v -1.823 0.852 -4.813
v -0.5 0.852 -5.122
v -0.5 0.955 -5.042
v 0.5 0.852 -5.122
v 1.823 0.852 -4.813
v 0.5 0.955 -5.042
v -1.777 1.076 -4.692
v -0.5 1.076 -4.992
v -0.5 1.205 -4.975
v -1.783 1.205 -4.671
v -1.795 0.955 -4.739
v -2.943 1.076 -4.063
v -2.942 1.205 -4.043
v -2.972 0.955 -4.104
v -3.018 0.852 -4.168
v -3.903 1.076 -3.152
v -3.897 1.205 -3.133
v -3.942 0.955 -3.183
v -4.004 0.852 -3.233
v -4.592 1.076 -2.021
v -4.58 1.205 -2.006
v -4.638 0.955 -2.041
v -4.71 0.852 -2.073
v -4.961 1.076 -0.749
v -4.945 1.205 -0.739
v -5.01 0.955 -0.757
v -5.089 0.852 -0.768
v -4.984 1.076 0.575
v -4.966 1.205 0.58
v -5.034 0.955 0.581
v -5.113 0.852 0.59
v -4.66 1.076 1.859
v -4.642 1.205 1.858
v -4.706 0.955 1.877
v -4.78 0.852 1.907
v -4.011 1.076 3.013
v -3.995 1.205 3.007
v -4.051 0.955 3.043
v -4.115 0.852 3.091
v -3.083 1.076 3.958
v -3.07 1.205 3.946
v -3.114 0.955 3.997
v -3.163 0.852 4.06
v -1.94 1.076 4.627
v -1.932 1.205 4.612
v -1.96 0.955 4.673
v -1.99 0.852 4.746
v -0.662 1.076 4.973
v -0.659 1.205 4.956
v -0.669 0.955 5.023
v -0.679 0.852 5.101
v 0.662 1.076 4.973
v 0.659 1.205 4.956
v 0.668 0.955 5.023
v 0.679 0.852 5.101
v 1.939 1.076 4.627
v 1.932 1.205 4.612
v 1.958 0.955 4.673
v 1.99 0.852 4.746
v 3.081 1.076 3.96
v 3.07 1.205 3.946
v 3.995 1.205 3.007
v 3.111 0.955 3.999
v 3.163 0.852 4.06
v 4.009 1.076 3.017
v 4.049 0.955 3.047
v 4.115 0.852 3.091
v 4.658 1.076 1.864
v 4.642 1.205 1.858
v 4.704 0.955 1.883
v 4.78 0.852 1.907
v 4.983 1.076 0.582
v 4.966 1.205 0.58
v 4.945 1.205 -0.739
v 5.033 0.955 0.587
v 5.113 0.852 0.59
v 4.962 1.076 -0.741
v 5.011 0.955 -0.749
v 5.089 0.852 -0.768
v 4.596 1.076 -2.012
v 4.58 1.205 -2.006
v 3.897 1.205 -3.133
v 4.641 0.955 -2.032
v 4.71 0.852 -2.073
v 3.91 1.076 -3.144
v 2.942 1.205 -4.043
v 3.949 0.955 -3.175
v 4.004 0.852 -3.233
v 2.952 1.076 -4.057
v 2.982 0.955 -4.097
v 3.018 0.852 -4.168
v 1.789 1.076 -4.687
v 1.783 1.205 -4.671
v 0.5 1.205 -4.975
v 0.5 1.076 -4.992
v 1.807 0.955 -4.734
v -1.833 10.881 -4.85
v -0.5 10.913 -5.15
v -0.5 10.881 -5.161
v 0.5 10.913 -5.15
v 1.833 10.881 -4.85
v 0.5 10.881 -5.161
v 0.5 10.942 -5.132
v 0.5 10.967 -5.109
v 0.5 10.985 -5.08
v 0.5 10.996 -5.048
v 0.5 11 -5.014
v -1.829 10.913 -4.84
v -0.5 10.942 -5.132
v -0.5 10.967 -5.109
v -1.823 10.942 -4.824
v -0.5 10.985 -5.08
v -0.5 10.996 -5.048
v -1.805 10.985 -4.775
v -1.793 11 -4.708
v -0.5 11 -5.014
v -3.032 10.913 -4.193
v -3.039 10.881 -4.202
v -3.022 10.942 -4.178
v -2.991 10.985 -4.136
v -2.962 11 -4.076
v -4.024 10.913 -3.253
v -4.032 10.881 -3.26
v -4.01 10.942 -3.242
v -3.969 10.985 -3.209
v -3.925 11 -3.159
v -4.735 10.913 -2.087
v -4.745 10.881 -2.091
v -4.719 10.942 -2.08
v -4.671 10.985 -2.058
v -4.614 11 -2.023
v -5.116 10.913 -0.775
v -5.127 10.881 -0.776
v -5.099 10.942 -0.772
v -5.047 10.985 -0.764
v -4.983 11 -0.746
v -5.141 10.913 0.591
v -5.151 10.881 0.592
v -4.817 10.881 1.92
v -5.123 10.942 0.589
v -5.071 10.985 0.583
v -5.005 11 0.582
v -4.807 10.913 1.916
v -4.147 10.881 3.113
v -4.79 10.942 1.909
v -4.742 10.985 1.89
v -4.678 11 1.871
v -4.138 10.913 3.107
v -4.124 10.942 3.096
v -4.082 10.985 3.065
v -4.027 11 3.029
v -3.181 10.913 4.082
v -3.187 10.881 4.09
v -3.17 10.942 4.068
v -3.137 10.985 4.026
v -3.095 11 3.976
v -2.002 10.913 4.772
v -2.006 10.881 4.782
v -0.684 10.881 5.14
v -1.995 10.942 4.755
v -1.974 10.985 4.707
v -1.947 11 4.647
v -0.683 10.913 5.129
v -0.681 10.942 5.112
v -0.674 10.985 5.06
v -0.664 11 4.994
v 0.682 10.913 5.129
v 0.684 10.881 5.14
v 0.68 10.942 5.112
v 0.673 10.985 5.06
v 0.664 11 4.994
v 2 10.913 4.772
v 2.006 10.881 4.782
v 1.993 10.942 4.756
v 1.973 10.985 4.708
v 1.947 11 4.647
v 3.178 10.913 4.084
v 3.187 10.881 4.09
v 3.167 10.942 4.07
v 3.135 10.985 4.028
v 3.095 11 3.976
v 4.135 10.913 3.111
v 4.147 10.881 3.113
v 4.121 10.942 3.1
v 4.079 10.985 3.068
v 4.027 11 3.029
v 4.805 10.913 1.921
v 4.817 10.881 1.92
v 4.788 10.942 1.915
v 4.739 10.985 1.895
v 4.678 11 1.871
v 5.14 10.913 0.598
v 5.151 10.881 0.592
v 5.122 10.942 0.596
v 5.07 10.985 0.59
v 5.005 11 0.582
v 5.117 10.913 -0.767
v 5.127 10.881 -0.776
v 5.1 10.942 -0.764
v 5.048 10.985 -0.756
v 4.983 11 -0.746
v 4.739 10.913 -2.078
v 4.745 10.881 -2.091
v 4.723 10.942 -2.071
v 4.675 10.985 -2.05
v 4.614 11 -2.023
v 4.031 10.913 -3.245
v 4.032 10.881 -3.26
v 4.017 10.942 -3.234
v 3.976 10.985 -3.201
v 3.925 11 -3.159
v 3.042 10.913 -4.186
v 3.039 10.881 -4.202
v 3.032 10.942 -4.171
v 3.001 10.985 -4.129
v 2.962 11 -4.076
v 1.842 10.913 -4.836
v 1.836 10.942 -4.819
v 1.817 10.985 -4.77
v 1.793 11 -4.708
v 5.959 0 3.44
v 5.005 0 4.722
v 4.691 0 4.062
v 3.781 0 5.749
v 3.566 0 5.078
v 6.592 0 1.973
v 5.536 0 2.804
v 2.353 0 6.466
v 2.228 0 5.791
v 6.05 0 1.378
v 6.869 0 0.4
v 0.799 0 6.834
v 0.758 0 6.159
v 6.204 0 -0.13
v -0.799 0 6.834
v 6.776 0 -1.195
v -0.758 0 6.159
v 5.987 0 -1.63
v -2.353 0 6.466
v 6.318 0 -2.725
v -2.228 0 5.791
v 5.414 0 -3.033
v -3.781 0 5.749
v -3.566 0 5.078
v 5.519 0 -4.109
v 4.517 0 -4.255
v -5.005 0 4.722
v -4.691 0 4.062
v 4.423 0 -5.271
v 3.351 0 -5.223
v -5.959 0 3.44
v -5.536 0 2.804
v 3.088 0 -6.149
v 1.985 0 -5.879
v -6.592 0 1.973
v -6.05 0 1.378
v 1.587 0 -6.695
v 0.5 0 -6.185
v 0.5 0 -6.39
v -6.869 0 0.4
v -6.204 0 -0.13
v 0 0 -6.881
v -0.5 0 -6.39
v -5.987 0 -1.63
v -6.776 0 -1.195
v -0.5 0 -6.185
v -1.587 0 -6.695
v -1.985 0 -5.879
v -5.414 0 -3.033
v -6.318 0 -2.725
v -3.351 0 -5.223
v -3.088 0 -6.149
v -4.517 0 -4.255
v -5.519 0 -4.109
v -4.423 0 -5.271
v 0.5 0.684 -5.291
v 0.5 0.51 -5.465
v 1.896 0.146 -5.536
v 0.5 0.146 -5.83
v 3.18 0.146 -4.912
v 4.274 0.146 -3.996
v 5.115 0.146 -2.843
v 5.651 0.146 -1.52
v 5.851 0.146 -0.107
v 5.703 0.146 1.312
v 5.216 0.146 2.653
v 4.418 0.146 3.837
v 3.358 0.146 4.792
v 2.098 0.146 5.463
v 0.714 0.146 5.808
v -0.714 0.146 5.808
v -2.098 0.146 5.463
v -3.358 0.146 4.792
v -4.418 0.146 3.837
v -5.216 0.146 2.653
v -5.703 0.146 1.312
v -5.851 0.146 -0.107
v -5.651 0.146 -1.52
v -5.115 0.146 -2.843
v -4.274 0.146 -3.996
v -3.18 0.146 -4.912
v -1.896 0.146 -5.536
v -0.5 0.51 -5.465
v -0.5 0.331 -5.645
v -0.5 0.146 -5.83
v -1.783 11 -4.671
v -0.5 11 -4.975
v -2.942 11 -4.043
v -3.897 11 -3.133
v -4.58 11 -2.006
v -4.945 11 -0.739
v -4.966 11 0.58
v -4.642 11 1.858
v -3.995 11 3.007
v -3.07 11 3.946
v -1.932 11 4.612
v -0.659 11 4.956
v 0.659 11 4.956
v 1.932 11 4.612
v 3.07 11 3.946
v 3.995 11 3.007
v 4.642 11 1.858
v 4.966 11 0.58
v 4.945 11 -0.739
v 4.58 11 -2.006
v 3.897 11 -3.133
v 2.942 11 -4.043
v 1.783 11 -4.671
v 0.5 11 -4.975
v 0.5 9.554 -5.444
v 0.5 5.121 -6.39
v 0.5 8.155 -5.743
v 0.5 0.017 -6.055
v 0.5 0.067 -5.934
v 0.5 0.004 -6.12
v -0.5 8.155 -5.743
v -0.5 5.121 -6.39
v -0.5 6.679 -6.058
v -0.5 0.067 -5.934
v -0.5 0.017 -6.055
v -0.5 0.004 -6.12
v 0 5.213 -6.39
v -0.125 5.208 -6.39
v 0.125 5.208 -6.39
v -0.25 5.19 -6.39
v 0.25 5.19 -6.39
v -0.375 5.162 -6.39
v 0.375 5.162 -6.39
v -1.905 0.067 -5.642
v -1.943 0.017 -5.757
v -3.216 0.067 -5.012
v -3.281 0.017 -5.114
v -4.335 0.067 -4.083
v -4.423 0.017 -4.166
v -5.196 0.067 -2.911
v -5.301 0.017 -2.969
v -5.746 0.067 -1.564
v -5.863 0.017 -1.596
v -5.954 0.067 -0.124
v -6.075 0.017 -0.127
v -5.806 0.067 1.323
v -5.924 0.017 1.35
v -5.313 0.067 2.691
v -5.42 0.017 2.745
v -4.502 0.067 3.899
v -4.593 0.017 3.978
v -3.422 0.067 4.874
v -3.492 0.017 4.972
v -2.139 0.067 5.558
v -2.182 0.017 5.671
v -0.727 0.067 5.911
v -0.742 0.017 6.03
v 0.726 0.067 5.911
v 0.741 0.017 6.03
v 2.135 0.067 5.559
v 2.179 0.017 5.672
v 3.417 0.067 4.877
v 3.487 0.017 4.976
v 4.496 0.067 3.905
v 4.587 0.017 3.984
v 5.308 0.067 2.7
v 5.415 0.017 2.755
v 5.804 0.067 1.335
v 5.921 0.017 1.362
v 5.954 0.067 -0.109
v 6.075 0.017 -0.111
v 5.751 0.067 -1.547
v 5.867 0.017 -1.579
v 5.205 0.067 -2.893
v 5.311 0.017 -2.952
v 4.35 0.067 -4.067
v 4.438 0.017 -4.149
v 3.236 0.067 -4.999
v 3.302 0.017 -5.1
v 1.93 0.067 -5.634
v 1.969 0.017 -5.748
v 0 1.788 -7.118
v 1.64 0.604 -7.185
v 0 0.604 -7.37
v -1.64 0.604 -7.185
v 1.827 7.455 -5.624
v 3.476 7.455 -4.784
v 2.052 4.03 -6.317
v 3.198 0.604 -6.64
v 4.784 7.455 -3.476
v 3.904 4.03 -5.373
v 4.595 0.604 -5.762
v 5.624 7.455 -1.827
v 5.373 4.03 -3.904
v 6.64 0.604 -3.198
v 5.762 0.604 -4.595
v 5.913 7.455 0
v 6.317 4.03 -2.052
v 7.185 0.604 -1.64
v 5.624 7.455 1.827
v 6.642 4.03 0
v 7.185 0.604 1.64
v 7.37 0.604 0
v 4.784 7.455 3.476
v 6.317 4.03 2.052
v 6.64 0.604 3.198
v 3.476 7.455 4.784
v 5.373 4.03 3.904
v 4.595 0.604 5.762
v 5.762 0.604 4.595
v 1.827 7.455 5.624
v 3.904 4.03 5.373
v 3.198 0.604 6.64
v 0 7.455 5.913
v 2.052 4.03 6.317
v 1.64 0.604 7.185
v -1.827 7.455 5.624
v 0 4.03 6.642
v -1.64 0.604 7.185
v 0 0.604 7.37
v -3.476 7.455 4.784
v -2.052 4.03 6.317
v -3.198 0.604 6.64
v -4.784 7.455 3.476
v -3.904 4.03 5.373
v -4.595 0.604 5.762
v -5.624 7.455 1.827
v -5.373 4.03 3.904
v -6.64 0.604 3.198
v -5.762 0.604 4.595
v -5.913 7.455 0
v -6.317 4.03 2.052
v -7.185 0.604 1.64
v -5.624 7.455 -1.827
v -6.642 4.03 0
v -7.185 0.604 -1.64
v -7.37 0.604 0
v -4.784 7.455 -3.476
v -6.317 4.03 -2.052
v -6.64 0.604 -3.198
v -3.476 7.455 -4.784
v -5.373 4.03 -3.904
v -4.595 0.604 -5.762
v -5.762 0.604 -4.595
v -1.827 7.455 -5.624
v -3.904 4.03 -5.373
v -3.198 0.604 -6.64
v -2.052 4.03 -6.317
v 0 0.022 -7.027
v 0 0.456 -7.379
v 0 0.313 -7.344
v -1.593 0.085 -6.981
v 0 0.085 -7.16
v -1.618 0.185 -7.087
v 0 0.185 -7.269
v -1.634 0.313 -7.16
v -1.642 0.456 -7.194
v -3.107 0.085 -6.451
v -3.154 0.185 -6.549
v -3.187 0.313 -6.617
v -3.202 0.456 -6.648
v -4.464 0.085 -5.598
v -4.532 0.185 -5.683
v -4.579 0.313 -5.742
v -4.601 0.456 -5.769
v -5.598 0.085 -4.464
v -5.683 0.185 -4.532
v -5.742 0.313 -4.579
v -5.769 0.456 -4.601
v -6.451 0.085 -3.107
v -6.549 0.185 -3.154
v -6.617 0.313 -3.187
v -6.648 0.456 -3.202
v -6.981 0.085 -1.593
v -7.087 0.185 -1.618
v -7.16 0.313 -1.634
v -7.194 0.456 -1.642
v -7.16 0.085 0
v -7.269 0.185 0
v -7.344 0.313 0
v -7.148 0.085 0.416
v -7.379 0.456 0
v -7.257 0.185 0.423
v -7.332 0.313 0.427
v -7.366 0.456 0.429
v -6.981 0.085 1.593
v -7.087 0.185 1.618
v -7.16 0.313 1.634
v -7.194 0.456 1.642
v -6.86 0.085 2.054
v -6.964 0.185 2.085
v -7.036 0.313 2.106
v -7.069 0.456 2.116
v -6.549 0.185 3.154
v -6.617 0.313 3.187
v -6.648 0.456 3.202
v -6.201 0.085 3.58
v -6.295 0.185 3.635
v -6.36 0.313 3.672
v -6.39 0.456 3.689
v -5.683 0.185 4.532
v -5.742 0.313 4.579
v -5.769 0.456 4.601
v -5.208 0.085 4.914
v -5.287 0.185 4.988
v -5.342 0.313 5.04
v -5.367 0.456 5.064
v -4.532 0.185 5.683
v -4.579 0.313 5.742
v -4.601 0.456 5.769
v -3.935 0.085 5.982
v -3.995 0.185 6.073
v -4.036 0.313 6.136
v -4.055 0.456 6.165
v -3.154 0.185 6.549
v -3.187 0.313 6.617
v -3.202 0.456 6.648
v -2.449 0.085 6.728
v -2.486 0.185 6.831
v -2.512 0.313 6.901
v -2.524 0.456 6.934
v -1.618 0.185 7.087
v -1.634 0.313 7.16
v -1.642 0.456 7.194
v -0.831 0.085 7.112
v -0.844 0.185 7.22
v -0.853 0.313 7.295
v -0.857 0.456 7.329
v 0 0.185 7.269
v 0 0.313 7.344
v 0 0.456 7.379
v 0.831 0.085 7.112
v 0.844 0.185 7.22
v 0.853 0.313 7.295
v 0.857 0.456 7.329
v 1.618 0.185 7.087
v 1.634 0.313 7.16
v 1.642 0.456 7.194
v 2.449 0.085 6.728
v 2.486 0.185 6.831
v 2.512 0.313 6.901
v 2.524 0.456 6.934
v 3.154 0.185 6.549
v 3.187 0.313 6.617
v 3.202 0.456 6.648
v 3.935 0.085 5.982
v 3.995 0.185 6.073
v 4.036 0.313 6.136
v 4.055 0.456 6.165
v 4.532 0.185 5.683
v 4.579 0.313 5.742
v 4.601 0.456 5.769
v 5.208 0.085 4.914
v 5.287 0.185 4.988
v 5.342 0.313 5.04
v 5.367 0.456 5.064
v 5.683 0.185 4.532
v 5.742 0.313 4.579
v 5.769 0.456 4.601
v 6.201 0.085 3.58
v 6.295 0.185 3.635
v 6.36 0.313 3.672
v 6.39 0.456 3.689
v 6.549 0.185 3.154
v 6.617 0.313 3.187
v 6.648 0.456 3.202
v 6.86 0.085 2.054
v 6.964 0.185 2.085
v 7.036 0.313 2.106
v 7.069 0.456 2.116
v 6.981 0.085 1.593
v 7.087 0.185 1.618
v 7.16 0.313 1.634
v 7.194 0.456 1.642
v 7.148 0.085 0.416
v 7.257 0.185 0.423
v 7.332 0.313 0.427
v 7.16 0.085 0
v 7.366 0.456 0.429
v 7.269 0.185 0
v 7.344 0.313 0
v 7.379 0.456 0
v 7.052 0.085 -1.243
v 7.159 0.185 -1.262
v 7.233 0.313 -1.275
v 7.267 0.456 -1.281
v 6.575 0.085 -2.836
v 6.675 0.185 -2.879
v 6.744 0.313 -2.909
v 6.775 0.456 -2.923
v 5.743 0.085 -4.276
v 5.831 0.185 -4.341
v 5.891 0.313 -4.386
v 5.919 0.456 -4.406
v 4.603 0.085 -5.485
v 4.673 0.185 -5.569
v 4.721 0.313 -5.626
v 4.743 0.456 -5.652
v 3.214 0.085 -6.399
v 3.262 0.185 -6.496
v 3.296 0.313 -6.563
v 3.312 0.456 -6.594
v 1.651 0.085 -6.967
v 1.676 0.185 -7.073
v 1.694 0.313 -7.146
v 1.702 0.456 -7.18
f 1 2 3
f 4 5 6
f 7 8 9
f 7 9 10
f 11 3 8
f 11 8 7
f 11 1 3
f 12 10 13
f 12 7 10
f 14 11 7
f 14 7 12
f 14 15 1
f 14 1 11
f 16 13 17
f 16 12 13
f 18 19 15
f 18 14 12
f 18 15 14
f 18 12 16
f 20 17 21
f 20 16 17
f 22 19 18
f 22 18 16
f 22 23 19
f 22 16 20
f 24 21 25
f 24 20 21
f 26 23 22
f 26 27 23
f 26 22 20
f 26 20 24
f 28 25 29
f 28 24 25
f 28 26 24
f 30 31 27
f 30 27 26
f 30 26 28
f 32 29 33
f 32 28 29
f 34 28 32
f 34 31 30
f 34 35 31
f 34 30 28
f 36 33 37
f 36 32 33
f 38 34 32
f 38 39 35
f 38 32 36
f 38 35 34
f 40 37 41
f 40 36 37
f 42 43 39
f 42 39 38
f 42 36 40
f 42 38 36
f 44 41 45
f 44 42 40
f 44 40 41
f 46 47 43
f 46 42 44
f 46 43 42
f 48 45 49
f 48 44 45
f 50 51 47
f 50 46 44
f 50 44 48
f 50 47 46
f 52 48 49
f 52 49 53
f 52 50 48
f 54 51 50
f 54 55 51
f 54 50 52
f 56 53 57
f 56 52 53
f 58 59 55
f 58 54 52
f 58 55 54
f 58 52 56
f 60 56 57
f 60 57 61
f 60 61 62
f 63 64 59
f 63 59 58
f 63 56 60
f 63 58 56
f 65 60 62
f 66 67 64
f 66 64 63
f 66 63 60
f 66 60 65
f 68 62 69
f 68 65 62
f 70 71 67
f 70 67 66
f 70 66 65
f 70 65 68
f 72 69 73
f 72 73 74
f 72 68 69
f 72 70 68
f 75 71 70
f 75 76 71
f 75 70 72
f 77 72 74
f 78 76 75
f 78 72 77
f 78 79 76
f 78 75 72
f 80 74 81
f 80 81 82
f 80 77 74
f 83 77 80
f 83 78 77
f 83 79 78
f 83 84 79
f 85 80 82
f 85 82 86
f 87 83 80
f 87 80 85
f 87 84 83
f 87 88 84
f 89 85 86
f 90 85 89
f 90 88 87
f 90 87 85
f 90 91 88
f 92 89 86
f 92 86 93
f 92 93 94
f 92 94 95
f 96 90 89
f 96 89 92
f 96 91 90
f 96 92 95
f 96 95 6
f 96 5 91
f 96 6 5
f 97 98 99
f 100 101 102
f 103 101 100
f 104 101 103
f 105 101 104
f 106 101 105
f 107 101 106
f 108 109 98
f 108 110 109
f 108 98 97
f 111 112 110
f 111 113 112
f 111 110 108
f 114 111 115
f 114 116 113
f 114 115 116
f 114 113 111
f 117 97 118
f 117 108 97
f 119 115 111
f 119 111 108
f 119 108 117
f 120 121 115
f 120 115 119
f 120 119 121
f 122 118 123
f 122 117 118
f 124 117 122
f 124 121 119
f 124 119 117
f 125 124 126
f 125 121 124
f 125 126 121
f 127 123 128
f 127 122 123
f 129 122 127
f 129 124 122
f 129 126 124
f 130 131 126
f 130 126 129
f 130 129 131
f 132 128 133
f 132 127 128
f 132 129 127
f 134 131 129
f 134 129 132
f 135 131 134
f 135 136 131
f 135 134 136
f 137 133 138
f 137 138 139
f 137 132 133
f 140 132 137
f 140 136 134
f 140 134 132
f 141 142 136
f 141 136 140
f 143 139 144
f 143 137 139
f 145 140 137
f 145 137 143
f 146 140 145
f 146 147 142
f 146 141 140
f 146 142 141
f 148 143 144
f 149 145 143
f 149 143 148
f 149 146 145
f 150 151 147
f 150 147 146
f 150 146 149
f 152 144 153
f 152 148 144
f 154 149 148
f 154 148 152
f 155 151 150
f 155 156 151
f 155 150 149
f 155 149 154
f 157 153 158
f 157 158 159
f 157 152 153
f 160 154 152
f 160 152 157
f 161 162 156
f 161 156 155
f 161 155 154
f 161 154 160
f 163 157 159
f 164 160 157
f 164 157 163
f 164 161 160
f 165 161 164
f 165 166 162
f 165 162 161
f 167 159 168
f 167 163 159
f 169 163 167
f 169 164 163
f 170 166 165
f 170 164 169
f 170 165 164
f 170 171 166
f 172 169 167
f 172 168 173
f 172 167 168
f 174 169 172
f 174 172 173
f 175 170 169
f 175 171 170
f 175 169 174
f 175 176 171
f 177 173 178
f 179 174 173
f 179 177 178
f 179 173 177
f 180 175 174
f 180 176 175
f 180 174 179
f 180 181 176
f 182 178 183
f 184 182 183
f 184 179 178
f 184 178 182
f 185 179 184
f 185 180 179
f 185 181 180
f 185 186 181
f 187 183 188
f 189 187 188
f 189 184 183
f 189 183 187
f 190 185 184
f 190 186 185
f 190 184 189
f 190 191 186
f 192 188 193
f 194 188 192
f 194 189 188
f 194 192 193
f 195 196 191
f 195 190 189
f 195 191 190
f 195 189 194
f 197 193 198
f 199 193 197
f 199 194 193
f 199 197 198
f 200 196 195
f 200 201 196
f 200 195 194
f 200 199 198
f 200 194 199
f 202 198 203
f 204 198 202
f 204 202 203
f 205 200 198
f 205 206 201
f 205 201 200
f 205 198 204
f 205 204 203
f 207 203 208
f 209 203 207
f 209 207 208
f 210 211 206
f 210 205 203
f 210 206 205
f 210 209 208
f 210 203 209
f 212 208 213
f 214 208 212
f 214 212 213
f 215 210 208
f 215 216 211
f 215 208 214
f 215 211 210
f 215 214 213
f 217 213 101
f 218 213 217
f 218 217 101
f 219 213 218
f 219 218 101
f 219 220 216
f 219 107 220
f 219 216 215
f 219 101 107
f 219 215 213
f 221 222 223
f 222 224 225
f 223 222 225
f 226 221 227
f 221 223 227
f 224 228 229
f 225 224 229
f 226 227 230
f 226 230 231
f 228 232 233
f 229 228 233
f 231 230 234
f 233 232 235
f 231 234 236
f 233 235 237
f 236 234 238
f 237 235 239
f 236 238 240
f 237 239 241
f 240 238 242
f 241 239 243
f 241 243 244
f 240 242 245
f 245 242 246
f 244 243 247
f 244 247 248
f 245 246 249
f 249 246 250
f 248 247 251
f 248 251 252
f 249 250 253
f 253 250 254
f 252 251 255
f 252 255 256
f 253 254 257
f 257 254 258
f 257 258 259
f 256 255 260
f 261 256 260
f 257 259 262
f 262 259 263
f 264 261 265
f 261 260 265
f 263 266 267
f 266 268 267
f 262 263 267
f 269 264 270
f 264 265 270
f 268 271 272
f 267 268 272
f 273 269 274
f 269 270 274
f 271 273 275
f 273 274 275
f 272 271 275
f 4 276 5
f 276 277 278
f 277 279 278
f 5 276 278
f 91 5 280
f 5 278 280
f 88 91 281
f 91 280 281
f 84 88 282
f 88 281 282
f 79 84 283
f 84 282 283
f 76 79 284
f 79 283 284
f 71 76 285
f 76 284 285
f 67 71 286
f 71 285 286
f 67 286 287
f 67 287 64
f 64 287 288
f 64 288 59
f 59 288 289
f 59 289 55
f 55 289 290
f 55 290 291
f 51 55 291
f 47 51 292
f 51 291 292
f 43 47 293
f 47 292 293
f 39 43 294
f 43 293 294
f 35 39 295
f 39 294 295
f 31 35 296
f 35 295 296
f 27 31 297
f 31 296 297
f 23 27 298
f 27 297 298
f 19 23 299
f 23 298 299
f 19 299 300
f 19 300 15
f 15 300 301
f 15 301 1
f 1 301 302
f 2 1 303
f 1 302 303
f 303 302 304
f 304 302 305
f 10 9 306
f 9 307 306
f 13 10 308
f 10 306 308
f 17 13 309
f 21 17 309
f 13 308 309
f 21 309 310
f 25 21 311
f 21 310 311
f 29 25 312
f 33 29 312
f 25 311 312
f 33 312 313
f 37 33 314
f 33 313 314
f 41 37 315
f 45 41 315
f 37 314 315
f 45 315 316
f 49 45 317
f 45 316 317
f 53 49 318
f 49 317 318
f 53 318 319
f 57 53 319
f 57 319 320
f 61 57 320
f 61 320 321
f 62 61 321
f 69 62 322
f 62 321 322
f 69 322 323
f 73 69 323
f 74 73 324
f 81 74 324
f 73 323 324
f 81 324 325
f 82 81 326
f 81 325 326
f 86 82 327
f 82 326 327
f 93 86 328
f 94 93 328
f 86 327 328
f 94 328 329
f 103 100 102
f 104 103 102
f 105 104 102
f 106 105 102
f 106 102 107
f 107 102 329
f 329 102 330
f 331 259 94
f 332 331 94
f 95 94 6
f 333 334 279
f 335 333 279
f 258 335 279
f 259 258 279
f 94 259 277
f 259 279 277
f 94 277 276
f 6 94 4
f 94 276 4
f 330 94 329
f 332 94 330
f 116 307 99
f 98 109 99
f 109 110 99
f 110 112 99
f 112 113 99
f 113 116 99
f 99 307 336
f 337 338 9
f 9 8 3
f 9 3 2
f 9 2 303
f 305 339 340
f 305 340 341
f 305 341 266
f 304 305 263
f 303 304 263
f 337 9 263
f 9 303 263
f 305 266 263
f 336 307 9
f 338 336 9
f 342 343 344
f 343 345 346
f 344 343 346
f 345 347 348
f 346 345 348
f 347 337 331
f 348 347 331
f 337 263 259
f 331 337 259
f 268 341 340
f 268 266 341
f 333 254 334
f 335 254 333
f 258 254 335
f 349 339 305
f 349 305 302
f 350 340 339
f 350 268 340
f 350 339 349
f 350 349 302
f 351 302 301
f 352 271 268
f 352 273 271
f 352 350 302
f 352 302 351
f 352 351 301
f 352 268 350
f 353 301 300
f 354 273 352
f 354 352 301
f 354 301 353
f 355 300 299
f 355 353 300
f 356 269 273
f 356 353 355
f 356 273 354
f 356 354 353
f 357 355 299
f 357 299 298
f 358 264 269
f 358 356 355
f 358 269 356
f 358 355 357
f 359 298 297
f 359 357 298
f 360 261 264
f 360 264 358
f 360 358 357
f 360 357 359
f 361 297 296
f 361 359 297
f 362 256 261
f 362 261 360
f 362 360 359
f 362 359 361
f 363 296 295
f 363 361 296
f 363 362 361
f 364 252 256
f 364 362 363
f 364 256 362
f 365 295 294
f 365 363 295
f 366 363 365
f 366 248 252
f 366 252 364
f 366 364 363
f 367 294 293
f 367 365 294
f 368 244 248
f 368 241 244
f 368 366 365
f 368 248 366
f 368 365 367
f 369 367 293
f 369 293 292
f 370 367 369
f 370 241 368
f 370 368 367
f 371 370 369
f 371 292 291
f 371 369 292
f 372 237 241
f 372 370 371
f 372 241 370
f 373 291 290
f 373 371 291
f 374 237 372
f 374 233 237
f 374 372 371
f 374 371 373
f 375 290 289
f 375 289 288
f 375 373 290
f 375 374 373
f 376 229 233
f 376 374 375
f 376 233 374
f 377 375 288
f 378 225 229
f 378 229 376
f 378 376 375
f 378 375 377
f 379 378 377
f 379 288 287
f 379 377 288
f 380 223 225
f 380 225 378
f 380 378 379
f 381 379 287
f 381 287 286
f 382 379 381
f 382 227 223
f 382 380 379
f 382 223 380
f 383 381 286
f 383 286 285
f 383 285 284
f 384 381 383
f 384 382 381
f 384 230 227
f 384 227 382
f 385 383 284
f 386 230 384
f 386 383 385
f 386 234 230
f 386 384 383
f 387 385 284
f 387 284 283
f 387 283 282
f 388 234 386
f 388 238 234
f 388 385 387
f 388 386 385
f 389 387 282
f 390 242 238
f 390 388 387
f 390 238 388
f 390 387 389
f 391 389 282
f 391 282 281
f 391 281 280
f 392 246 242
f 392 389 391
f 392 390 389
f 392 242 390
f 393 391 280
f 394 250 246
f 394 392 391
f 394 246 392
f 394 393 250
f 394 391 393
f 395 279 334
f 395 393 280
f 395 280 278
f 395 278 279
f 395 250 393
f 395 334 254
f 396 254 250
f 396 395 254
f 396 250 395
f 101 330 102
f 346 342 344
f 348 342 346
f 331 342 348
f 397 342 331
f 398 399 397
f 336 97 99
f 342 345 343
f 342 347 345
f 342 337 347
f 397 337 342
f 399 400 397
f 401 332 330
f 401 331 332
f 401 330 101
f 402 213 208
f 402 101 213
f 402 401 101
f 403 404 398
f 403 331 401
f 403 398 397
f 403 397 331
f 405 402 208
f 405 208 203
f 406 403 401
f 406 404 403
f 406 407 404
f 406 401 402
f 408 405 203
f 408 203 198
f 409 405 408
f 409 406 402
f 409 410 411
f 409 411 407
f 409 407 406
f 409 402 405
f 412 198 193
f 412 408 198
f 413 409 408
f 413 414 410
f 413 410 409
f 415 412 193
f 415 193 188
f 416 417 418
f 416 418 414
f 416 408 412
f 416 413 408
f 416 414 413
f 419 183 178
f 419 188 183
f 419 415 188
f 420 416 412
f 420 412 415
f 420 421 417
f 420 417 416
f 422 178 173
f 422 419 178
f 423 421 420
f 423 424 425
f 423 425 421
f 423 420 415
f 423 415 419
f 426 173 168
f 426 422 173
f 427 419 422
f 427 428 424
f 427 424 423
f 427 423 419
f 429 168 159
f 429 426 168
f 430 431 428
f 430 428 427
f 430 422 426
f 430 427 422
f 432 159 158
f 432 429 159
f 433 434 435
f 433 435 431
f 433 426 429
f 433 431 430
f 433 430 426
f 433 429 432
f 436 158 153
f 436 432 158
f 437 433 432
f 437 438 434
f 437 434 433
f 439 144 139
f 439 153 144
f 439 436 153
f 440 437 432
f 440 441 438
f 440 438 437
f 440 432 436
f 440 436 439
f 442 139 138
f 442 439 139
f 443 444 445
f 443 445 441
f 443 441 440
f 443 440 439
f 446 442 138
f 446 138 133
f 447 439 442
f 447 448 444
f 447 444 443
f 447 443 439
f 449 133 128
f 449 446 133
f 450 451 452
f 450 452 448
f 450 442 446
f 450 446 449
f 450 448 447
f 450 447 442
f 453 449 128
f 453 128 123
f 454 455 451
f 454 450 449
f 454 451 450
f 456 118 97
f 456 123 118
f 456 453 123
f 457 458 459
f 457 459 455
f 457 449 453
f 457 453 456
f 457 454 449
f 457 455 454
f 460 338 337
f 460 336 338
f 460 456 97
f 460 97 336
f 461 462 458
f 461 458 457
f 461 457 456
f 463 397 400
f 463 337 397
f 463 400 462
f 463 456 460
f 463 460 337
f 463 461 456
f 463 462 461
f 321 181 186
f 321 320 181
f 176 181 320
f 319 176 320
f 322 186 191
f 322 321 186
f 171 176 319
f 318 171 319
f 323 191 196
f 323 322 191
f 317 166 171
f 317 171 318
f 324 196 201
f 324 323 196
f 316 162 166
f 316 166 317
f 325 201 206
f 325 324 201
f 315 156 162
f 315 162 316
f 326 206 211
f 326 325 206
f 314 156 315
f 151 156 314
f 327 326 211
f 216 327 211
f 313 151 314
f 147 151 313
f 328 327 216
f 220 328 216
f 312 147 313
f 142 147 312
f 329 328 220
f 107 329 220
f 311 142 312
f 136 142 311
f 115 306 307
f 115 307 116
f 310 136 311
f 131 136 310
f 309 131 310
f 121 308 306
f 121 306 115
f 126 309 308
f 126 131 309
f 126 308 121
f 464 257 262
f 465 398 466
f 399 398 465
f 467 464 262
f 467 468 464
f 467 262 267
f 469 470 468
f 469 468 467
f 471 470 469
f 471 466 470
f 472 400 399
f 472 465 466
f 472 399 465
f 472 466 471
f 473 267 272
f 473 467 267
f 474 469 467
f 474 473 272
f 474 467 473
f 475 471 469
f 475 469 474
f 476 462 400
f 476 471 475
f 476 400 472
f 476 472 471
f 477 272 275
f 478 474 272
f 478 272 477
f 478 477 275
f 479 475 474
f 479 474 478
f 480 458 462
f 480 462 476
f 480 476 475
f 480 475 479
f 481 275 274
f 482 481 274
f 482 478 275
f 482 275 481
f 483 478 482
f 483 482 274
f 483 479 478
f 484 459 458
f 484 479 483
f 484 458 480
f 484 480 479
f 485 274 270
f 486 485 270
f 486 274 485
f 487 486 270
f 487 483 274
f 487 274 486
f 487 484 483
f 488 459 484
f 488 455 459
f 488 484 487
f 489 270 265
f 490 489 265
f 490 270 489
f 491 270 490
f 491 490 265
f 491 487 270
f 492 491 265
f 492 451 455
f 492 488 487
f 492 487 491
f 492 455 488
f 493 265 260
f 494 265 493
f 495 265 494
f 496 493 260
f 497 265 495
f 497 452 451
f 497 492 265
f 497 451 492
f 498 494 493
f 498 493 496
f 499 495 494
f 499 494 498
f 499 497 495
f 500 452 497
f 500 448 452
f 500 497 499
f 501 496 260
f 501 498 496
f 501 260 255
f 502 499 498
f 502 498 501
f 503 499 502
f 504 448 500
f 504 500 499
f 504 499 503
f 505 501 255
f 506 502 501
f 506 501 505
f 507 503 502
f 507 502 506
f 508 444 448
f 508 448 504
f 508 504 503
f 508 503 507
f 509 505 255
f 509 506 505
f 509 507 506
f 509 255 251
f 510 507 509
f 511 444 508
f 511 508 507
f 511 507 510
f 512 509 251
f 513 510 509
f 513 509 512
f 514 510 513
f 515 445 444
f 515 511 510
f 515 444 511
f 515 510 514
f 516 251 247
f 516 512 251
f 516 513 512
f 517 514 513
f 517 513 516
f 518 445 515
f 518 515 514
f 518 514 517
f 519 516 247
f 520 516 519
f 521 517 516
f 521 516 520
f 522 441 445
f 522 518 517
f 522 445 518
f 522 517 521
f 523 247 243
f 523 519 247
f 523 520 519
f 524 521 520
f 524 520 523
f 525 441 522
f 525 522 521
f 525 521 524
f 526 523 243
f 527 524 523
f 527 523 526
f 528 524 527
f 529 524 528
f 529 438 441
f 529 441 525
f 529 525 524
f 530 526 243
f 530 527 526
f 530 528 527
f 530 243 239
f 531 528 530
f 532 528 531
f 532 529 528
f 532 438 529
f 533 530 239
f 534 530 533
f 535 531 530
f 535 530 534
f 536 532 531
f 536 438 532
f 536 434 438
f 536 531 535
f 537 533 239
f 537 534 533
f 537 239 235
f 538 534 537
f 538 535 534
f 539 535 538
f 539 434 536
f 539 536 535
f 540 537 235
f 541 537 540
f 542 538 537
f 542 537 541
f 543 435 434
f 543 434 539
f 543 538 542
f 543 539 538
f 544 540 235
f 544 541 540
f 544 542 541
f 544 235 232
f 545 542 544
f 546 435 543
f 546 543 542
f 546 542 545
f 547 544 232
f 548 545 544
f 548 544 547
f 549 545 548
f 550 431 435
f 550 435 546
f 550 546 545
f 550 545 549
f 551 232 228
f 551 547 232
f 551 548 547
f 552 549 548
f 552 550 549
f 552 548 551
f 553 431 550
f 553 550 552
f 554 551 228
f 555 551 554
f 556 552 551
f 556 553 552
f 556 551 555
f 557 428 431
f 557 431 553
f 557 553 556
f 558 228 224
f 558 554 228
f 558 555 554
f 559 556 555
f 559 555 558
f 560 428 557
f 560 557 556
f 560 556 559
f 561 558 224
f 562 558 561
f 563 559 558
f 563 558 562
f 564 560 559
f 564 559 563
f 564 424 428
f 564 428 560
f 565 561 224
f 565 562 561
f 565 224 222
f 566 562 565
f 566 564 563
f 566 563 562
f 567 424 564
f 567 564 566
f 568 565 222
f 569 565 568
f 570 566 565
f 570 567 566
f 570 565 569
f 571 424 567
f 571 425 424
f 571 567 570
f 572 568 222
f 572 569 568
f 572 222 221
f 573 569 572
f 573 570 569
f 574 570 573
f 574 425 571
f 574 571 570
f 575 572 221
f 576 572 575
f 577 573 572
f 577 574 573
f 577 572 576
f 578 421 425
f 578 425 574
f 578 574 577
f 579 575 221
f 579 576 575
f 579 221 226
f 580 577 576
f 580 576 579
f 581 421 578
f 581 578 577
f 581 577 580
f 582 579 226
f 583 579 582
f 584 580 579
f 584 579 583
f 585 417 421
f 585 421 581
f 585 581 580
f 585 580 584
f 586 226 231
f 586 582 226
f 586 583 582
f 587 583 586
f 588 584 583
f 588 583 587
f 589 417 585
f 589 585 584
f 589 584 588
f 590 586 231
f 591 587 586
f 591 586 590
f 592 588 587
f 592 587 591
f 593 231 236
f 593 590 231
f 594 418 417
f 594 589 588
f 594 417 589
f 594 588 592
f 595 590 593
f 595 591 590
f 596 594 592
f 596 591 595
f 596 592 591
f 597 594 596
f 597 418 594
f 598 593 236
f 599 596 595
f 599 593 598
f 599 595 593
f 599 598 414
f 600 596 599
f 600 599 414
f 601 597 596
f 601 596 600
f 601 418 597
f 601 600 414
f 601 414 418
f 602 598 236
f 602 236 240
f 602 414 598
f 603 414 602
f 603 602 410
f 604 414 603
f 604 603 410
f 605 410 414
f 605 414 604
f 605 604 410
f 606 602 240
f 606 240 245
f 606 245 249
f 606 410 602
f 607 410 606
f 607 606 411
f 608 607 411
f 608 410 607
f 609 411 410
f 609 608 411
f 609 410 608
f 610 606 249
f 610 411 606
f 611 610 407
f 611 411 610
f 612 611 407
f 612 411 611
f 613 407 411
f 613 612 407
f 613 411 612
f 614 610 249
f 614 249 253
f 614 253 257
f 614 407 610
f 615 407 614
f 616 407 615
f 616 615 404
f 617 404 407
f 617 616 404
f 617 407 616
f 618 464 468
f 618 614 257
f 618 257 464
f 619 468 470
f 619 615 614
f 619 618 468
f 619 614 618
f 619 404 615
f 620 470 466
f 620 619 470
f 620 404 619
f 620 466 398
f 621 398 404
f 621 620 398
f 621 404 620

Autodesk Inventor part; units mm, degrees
ref_plane "YZ Plane" through (0, 0, 0) normal (1, 0, 0) x (0, 1, 0)
ref_plane "XZ Plane" through (0, 0, 0) normal (0, 1, 0) x (-1, 0, 0)
ref_plane "XY Plane" through (0, 0, 0) normal (0, 0, 1) x (1, 0, 0)
sketch "Sketch1" plane through (0, 0, 0) normal (1, 0, 0) x (0, 1, 0)
  line L0 (11, -5) -> (11, -5.0385)
  line L1 (10.8812, -5.1853) -> (0.604, -7.3697)
  line L2 (0, -6.8807) -> (0, -6.2052)
  line L3 (0.1464, -5.8517) -> (0.8517, -5.1464)
  line L4 (1.2052, -5) -> (11, -5)
  line L5 (0, 0) -> (10.4698, 0) construction
  arc A0 (0, -6.8807) -> (0.604, -7.3697) centre (0.5, -6.8807) ccw
  arc A1 (0.1464, -5.8517) -> (0, -6.2052) centre (0.5, -6.2052) ccw
  arc A2 (10.8812, -5.1853) -> (11, -5.0385) centre (10.85, -5.0385) ccw
  arc A3 (1.2052, -5) -> (0.8517, -5.1464) centre (1.2052, -5.5) ccw
  point P0 (11, -5.16)
  point P1 (0, -7.4981)
  point P2 (0, -5.9981)
  dimension "d0" = 11
  dimension "d1" = 12
  dimension "d2" = 5.16
  dimension "d3" = 5
  dimension "d4" = 1.5
  dimension "d6" = 45
  dimension "d7" = 7.4981
  dimension "d8" = 0.5
  dimension "d9" = 0.15
revolve "Revolution1" add sketch "Sketch1" angle 360 about axis through (0, 0, 0) along (0, 1, 0)
sketch "Sketch2" plane through (0, 0, 0) normal (0, 1, 0) x (-1, 0, 0)
  line L0 (0.5, -6.39) -> (-0.5, -6.39)
  line L1 (-0.5, -6.39) -> (-0.5, 0)
  line L2 (-0.5, 0) -> (0.5, 0)
  line L3 (0.5, 0) -> (0.5, -6.39)
  point P0 (0, 0)
  point P1 (0, 0)
  dimension "d11" = 1
  dimension "d12" = 6.39
extrude "Extrusion1" cut sketch "Sketch2" along normal through all
properties part number "Component 43(Engine Cone)"
